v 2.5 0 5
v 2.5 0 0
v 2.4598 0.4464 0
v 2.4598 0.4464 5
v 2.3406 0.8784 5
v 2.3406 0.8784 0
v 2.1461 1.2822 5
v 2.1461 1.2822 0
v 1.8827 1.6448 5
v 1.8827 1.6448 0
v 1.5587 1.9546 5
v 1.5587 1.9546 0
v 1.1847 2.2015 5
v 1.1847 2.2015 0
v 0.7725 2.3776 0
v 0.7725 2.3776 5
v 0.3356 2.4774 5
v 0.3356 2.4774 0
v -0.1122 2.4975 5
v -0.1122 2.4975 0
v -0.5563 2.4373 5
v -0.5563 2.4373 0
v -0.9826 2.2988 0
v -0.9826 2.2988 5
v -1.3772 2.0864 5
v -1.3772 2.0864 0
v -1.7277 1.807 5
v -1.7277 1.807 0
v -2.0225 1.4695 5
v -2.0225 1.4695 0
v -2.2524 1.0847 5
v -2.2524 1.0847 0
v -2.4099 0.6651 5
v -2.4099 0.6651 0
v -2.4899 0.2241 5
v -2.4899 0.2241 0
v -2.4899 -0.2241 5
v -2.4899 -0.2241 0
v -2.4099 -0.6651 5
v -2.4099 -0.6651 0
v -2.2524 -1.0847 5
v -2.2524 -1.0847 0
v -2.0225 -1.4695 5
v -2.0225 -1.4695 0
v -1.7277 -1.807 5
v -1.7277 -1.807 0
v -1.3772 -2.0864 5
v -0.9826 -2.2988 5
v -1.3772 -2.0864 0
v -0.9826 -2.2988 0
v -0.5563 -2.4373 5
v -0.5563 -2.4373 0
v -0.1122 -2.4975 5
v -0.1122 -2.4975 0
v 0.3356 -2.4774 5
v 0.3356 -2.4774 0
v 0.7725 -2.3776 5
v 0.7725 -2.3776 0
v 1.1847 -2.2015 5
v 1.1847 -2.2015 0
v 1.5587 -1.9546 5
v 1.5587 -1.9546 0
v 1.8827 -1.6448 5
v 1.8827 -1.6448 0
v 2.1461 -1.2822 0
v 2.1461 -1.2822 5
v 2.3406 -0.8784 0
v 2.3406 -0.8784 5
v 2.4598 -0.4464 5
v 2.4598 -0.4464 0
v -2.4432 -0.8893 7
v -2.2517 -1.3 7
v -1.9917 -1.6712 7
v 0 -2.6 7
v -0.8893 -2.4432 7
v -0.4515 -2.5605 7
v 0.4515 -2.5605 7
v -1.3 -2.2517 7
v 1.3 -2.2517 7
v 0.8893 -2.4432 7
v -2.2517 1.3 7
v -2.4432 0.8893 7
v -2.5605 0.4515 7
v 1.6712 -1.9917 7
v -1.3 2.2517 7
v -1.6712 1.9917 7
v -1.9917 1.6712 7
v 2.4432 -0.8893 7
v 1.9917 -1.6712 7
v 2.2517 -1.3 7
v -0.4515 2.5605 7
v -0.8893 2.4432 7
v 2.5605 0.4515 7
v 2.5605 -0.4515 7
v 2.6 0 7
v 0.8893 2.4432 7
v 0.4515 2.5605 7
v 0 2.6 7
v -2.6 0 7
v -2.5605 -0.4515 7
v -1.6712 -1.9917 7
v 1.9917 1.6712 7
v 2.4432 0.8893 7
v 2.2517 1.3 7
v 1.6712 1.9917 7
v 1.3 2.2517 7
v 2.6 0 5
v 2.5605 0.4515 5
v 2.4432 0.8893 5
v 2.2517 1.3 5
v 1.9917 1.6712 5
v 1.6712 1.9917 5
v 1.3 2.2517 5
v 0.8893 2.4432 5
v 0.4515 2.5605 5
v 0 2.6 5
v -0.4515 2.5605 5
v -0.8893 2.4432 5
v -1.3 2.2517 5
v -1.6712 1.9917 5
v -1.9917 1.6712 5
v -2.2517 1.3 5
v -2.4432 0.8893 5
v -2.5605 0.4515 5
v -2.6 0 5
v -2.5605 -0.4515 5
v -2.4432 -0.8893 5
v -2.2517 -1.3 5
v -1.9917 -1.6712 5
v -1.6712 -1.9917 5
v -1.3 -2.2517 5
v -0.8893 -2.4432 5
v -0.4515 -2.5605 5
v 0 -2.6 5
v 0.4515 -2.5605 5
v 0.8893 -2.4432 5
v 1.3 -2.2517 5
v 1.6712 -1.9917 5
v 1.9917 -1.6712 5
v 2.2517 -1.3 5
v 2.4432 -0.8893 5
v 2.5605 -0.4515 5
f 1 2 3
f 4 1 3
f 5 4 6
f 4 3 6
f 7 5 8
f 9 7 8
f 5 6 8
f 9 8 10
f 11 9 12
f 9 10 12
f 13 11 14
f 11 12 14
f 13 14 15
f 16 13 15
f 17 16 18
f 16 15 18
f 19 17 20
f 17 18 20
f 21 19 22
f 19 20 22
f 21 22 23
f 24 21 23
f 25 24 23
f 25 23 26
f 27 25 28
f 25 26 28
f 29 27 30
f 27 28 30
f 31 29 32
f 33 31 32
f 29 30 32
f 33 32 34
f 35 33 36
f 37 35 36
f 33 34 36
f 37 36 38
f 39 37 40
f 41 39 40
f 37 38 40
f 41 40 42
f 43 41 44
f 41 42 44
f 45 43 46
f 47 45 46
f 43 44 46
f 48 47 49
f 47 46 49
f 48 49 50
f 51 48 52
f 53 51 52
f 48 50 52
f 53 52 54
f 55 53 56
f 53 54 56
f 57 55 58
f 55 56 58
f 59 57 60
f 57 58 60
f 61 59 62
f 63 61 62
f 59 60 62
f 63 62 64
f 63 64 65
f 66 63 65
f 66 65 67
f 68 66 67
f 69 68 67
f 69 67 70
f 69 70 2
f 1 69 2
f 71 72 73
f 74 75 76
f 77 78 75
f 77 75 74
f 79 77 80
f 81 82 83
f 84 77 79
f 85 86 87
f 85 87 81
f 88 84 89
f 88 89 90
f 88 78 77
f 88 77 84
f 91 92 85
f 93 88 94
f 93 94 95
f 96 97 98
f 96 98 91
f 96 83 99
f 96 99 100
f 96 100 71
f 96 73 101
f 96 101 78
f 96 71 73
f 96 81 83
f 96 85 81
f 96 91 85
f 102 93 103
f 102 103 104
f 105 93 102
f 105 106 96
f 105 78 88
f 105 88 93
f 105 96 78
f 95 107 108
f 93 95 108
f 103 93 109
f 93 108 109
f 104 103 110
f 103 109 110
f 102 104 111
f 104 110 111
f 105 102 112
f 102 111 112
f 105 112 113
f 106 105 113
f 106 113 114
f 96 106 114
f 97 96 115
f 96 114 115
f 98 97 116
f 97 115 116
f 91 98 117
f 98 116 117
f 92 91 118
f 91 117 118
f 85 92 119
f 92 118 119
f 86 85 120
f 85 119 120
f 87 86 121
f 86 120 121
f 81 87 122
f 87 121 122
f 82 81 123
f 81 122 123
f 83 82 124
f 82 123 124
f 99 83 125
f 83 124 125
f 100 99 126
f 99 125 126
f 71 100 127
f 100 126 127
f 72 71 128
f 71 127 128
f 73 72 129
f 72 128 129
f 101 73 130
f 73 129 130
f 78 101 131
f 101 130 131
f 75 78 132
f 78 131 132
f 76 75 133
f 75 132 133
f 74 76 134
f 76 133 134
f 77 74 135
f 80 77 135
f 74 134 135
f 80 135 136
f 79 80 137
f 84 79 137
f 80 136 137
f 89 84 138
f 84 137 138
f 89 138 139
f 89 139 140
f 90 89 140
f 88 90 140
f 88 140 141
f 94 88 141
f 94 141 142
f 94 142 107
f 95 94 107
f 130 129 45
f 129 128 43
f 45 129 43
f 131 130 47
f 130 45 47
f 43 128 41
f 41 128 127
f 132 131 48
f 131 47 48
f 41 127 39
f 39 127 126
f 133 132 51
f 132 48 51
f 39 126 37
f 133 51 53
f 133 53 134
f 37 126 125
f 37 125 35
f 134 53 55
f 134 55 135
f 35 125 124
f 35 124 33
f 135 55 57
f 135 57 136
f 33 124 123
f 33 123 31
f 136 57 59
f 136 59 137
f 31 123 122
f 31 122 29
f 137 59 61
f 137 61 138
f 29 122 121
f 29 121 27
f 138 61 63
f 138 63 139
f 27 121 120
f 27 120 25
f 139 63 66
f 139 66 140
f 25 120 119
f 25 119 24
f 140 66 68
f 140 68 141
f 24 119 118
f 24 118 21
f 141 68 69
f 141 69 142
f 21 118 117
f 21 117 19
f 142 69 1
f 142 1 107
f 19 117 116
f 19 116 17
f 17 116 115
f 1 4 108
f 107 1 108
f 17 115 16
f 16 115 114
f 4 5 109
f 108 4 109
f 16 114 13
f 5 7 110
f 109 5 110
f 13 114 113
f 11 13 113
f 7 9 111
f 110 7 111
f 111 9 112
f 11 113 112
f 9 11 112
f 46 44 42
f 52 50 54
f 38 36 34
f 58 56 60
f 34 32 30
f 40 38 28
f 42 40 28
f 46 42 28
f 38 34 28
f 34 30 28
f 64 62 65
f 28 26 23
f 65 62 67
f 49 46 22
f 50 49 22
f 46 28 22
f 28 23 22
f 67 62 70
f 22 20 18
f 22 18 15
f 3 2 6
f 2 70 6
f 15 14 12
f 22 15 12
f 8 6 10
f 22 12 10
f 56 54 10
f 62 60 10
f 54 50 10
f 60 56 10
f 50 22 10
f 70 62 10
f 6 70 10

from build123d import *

# Parameters (mm, degrees)
CYLINDER065_R     = 2.6
CYLINDER065_DEPTH = 2
CYLINDER064_R     = 2.5
CYLINDER064_DEPTH = 5


with BuildPart() as cilindro065:
    # Cylinder065 → Cylinder065 (new body)
    with BuildSketch(Plane.XY.offset(5)):
        Circle(CYLINDER065_R)
    extrude(amount=CYLINDER065_DEPTH)


with BuildPart() as enganche_lego:
    # Cylinder064 → Cylinder064 (new body)
    with BuildSketch(Plane.XY):
        Circle(CYLINDER064_R)
    extrude(amount=CYLINDER064_DEPTH)

    # Fusion022: union Cilindro065
    add(cilindro065.part)


solid = enganche_lego.part
